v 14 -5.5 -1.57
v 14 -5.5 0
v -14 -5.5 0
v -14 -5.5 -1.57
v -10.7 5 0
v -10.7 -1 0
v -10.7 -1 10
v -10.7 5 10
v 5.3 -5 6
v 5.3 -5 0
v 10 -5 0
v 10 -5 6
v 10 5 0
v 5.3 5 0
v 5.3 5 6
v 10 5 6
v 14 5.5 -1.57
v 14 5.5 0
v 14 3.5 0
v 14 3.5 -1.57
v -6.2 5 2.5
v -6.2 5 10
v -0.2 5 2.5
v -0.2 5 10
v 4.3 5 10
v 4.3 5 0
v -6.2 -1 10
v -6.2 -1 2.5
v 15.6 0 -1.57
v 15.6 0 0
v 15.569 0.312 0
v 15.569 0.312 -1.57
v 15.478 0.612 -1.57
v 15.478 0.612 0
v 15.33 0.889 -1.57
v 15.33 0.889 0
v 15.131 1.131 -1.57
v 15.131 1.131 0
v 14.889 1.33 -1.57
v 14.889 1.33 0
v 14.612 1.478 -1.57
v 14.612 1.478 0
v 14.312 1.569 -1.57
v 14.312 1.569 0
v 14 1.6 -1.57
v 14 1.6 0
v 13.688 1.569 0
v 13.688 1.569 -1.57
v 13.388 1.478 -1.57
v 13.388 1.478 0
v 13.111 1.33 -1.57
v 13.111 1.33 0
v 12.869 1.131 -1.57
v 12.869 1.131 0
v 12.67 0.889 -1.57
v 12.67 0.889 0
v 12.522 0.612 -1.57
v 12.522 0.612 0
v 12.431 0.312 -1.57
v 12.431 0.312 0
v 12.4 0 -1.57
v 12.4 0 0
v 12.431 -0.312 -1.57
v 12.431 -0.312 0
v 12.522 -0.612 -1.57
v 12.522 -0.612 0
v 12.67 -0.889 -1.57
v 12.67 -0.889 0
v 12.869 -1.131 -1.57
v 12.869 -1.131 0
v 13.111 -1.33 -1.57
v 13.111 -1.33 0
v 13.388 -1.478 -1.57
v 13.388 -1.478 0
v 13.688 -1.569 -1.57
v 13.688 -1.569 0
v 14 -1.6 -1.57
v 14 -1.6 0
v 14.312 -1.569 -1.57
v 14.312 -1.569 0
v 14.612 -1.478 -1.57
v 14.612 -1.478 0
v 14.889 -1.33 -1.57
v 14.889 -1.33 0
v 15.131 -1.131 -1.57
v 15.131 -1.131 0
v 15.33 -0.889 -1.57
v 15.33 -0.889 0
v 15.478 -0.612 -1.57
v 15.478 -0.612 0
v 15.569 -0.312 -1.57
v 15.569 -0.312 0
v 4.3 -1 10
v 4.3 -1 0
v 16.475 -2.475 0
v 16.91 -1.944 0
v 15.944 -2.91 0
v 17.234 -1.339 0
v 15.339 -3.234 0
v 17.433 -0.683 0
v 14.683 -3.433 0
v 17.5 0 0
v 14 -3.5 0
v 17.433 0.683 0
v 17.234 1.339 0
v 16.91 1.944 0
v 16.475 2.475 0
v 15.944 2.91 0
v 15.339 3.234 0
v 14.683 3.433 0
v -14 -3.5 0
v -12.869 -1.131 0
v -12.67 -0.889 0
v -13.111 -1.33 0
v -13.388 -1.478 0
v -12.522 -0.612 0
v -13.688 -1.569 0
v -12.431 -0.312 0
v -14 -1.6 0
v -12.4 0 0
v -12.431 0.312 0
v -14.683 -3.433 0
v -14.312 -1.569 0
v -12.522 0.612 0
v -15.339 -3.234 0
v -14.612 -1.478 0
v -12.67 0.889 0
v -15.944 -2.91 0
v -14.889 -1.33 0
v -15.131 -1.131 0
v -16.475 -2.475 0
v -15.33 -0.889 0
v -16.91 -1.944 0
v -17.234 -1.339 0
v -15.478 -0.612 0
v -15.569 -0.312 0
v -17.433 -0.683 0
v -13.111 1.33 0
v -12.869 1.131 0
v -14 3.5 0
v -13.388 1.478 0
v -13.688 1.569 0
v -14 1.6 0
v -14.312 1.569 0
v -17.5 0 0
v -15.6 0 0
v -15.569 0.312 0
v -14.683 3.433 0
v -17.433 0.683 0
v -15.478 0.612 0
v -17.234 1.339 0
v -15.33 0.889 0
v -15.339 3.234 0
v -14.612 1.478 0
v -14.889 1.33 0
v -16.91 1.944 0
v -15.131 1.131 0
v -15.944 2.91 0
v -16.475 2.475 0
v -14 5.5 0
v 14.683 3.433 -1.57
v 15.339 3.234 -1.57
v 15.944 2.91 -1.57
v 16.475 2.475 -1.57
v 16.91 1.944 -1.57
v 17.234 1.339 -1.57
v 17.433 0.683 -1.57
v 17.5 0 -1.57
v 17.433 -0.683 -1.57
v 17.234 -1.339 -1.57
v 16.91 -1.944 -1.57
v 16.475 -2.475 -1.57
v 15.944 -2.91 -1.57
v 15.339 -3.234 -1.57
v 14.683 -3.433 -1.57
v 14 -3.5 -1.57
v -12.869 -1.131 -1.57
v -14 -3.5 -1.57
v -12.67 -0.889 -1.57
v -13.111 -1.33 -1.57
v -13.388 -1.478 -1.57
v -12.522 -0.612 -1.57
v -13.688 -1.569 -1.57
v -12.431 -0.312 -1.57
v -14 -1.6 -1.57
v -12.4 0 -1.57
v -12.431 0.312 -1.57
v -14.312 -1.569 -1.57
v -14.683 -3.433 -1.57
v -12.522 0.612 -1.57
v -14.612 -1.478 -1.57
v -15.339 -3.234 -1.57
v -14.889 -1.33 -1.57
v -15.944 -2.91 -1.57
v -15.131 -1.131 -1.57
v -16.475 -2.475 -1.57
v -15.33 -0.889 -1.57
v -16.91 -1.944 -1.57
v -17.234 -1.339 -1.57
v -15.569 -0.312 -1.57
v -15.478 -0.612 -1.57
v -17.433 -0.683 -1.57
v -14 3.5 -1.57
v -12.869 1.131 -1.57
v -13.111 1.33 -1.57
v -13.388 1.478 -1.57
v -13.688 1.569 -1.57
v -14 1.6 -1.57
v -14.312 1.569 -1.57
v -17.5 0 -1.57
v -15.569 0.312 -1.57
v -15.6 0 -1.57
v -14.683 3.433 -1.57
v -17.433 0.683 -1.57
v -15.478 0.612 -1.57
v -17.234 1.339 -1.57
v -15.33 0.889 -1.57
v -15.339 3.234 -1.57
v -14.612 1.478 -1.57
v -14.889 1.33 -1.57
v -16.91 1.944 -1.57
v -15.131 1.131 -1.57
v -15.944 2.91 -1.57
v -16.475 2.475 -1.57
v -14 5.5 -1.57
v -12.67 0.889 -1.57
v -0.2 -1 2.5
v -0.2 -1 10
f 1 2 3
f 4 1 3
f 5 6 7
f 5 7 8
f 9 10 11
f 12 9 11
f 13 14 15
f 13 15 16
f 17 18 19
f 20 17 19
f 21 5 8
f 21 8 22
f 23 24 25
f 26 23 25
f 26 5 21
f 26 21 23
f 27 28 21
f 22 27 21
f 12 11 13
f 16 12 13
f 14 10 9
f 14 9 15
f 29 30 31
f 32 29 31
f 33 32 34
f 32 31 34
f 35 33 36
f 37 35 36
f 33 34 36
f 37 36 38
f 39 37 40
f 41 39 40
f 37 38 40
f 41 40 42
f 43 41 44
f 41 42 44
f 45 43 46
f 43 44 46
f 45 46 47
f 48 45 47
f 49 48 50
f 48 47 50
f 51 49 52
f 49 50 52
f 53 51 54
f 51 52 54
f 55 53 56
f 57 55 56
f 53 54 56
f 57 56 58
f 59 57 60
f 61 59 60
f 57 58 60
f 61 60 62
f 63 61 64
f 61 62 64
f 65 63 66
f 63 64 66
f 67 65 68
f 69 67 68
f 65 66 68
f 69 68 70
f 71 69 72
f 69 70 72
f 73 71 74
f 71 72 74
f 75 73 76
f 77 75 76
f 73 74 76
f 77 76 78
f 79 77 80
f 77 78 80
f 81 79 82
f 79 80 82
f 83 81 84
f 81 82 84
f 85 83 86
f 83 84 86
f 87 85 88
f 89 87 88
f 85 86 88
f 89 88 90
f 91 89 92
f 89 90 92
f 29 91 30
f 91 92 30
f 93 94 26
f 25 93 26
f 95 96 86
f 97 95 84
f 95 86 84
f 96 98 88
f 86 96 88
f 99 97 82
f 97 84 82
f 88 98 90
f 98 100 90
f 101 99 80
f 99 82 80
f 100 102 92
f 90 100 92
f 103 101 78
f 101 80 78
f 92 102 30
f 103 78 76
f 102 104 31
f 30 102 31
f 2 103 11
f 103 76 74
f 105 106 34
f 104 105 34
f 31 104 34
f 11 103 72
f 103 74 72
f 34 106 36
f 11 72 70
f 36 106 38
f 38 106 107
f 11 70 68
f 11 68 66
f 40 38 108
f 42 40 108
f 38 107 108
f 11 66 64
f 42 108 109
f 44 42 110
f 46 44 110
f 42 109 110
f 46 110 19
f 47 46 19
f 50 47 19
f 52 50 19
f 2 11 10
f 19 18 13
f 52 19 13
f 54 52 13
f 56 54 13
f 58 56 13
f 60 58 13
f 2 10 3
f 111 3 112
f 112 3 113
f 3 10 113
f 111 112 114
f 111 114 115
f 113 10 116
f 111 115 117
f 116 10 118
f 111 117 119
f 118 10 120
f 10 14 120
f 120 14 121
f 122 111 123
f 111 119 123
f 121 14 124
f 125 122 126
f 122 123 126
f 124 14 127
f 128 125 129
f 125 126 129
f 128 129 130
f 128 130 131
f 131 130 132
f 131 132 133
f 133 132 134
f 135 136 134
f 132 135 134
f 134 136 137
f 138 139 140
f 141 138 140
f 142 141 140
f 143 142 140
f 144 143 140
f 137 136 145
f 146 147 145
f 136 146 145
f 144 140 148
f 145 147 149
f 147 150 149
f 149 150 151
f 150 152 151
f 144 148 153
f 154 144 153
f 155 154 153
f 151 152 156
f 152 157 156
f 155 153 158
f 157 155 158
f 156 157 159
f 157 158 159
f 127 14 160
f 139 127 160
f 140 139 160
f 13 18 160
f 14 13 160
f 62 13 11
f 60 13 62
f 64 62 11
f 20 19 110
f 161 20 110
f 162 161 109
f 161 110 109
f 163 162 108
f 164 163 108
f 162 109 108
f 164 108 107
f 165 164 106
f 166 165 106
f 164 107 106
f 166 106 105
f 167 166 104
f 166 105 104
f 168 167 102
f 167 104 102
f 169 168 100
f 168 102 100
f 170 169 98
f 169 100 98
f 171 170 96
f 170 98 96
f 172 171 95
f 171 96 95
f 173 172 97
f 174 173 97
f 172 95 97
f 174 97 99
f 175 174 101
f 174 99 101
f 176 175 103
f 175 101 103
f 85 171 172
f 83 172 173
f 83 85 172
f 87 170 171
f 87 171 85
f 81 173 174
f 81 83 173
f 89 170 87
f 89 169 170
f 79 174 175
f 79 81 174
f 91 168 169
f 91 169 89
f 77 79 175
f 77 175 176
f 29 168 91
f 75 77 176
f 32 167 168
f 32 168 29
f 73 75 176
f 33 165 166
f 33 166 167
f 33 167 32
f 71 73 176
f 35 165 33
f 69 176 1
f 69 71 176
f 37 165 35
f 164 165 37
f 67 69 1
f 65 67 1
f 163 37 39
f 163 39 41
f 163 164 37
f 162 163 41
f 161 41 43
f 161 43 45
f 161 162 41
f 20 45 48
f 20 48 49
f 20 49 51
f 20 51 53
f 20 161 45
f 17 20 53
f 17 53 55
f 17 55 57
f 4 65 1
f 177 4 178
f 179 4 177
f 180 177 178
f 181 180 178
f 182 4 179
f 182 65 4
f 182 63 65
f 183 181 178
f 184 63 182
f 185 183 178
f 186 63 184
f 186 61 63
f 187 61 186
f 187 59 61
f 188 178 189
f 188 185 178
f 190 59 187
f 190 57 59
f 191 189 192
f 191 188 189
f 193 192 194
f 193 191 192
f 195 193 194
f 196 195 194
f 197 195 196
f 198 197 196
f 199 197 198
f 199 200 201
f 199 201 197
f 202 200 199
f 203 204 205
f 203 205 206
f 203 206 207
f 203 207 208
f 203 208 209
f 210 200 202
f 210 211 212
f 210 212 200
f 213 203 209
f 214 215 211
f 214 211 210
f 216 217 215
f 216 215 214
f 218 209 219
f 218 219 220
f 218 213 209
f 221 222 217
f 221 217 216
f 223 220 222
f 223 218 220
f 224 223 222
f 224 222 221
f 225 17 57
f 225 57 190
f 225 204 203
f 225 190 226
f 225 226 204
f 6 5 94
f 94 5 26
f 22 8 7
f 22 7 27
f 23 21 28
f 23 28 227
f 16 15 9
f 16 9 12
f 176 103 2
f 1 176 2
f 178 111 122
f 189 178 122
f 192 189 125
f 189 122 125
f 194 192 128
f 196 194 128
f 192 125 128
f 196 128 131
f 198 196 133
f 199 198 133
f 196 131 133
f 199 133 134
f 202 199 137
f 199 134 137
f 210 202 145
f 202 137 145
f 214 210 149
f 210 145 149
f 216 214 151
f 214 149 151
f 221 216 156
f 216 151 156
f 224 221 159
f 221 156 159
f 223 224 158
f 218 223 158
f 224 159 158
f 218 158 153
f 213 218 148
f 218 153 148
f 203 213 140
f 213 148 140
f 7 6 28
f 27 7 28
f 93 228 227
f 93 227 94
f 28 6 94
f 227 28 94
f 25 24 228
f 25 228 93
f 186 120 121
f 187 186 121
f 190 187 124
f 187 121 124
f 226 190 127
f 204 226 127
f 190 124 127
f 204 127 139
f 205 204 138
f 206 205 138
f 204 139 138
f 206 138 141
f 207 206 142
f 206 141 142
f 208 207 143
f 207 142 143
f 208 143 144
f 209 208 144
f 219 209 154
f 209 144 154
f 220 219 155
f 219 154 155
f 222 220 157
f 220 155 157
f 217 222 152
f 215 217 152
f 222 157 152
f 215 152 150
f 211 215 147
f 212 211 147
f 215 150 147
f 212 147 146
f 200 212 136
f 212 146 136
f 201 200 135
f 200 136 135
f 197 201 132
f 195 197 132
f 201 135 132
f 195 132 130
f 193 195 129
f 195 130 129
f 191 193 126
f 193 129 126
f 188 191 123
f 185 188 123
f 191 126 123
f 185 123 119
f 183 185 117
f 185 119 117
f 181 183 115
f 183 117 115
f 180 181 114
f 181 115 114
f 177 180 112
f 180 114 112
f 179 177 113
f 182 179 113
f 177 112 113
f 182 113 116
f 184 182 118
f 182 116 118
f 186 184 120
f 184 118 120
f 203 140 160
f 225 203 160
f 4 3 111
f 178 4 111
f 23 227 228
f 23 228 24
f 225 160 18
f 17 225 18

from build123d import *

# Parameters (mm, degrees)
SKETCH1_R                  = 1.6
PCB_DEPTH                  = 1.57
SKETCH2_W                  = 6
SKETCH2_H                  = 6
OPTICAL_SENSOR_BASE_DEPTH  = 2.5
SKETCH2_3_W                = 4.5
SKETCH2_3_H                = 6
OPTICAL_SENSOR_SIDES_DEPTH = 10
SKETCH2_4_W                = 4.7
SKETCH2_4_H                = 10
CONNECTOR_DEPTH            = 6


with BuildPart() as part:
    # Sketch1 → PCB (new body)
    with BuildSketch(Plane.XY):
        with BuildLine():
            Line((-14, 3.5), (-14, 5.5))
            Line((-14, 5.5), (14, 5.5))
            Line((14, 5.5), (14, 3.5))
            ThreePointArc((14, 3.5), (17.5, 0), (14, -3.5))
            Line((14, -3.5), (14, -5.5))
            Line((14, -5.5), (-14, -5.5))
            Line((-14, -5.5), (-14, -3.5))
            ThreePointArc((-14, -3.5), (-17.5, 0), (-14, 3.5))
        make_face()
        with Locations((-14, 0)):
            Circle(SKETCH1_R, mode=Mode.SUBTRACT)
        with Locations((14, 0)):
            Circle(SKETCH1_R, mode=Mode.SUBTRACT)
    extrude(amount=-PCB_DEPTH)

    # Sketch2<4> → Connector (add)
    with BuildSketch(Plane.XY):
        with Locations((7.65, 0)):
            Rectangle(SKETCH2_4_W, SKETCH2_4_H)
    extrude(amount=CONNECTOR_DEPTH)


with BuildPart() as body_2:
    # Sketch2 → Optical Sensor Base (new body)
    with BuildSketch(Plane.XY):
        with Locations((-3.2, 2)):
            Rectangle(SKETCH2_W, SKETCH2_H)
    extrude(amount=OPTICAL_SENSOR_BASE_DEPTH)

    # Sketch2<3> → Optical Sensor Sides (add)
    with BuildSketch(Plane.XY):
        with Locations((-8.45, 2)):
            Rectangle(SKETCH2_3_W, SKETCH2_3_H)
        with Locations((2.05, 2)):
            Rectangle(SKETCH2_3_W, SKETCH2_3_H)
    extrude(amount=OPTICAL_SENSOR_SIDES_DEPTH)


solid = Compound([part.part, body_2.part])
